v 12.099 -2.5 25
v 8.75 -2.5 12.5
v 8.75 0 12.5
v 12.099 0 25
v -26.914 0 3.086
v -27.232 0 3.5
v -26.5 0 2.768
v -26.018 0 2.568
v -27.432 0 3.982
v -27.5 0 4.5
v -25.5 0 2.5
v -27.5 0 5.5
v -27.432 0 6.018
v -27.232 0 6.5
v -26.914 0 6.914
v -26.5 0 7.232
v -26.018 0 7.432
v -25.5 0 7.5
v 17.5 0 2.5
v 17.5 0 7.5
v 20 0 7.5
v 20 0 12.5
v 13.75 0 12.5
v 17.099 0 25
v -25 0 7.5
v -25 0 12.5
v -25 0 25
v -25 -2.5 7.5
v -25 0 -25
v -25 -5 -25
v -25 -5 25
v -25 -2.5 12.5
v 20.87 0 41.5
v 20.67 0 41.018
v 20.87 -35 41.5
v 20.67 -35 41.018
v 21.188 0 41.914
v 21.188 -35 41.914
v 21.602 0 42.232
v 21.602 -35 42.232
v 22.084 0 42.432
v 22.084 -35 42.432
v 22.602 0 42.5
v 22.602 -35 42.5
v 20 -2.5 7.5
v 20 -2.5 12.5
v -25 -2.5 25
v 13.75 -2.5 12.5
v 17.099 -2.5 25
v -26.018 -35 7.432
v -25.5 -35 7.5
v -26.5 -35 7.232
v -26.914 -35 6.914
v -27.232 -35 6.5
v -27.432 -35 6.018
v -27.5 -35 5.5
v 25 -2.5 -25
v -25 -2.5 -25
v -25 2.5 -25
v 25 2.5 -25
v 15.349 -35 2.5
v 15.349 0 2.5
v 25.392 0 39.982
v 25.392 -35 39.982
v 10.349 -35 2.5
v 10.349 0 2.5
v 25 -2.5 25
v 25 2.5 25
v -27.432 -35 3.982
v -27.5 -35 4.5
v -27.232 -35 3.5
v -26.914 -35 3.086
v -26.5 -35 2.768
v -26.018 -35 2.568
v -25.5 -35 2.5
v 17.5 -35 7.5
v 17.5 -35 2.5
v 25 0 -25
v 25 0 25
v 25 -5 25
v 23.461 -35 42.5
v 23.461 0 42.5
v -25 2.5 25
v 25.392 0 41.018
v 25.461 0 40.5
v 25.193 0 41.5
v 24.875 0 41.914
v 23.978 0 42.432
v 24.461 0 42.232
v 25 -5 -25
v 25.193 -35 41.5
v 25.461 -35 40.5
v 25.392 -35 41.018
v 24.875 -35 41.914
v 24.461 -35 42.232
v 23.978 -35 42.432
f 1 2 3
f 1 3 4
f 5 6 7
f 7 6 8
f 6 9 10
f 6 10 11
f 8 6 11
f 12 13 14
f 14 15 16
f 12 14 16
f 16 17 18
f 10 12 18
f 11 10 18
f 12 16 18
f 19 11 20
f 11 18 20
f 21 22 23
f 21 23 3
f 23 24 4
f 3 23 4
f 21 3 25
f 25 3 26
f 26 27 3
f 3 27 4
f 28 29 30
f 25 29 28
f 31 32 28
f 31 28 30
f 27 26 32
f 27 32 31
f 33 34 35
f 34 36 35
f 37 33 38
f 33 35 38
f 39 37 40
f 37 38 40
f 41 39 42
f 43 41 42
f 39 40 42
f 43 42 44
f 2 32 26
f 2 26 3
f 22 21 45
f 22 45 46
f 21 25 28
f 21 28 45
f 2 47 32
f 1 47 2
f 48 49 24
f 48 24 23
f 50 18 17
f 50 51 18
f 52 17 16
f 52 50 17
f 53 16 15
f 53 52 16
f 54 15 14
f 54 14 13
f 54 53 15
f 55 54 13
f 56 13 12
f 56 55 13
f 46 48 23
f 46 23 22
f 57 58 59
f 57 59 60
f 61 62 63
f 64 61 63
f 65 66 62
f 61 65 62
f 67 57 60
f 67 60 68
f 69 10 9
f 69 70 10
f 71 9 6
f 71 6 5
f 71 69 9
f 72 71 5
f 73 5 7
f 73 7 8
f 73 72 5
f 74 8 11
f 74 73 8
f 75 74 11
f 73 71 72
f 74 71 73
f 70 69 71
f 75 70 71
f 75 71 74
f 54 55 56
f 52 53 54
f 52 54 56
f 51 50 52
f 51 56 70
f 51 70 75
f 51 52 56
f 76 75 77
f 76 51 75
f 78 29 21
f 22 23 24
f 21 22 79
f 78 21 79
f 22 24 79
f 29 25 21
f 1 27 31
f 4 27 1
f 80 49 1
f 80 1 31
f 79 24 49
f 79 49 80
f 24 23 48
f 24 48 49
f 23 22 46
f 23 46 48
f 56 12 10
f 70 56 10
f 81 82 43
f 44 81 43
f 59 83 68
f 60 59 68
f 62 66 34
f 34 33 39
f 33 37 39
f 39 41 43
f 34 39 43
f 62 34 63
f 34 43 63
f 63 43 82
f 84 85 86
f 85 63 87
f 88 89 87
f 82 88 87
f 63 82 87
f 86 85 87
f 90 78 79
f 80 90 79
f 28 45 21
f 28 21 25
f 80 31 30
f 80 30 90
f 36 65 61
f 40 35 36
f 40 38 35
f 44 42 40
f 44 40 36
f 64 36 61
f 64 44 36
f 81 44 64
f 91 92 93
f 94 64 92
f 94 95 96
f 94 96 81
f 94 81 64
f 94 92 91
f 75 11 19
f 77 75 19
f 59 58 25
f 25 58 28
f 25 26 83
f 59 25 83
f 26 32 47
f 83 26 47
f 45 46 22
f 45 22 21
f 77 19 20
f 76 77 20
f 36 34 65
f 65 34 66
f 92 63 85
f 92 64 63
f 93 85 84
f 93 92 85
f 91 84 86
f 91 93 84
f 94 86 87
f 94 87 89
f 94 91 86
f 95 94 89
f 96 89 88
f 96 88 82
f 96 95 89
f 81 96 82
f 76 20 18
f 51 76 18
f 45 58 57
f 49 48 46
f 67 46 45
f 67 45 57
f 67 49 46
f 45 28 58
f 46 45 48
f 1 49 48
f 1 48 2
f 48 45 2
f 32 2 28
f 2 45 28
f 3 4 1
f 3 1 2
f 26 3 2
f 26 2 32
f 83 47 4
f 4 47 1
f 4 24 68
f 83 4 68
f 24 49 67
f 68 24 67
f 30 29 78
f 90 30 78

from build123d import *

# Parameters (mm, degrees)
SKETCH_W        = 50
SKETCH_H        = 50
PAD_DEPTH       = 2.5
POCKET_DEPTH    = 2.5
PAD001_DEPTH    = 35
FILLET_R        = 2
PAD002_DEPTH    = 35
FILLET001_R     = 2
SKETCH004_W     = 50
SKETCH004_H     = 50
PAD003_DEPTH    = 5
POCKET001_DEPTH = 2.5


with BuildPart() as right_leg:
    # Sketch → Pad (new body, symmetric)
    with BuildSketch(Plane.XZ):
        Rectangle(SKETCH_W, SKETCH_H)
    extrude(amount=PAD_DEPTH, both=True)

    # Sketch001 (on Face6 of Pad) → Pocket (cut)
    with BuildSketch(Plane.XZ.offset(2.5)):
        Polygon((-25, 7.5), (-25, 12.5), (8.75, 12.5), (12.099365, 25), (17.099365, 25), (13.75, 12.5), (20, 12.5), (20, 7.5), align=None)
    extrude(amount=-POCKET_DEPTH, mode=Mode.SUBTRACT)


with BuildPart() as seat:
    # Sketch002 → Pad001 (new body)
    with BuildSketch(Plane.XZ):
        Polygon((17.499976, 2.5), (17.499976, 7.5), (-27.500024, 7.5), (-27.5, 2.5), align=None)
    extrude(amount=PAD001_DEPTH)

    # Fillet
    fillet_edges = [seat.edges().sort_by_distance(p)[0] for p in [
        (-27.500024, -17.5, 7.5),
        (-27.5, -17.5, 2.5),
    ]]
    fillet(fillet_edges, radius=FILLET_R)


with BuildPart() as back_rest:
    # Sketch003 → Pad002 (new body)
    with BuildSketch(Plane.XZ):
        Polygon((21.06706, 42.5), (10.349092, 2.5), (15.349092, 2.5), (26.06706, 42.5), align=None)
    extrude(amount=PAD002_DEPTH)

    # Fillet001
    fillet001_edges = [back_rest.edges().sort_by_distance(p)[0] for p in [
        (21.06706, -17.5, 42.5),
        (26.06706, -17.5, 42.5),
    ]]
    fillet(fillet001_edges, radius=FILLET001_R)


with BuildPart() as left_leg:
    # Sketch004 → Pad003 (new body)
    with BuildSketch(Plane.XZ):
        Rectangle(SKETCH004_W, SKETCH004_H)
    extrude(amount=PAD003_DEPTH)

    # Sketch005 (on Face5 of Pad003) → Pocket001 (cut)
    with BuildSketch(Plane(origin=(0, 0, 0), x_dir=(1, 0, 0), z_dir=(0, 1, 0))):
        Polygon((-25, -12.5), (-25, -7.5), (20, -7.5), (20, -12.5), (13.75, -12.5), (17.099365, -25), (12.099365, -25), (8.75, -12.5), align=None)
    extrude(amount=-POCKET001_DEPTH, mode=Mode.SUBTRACT)


solid = Compound([right_leg.part, seat.part, back_rest.part, left_leg.part])
